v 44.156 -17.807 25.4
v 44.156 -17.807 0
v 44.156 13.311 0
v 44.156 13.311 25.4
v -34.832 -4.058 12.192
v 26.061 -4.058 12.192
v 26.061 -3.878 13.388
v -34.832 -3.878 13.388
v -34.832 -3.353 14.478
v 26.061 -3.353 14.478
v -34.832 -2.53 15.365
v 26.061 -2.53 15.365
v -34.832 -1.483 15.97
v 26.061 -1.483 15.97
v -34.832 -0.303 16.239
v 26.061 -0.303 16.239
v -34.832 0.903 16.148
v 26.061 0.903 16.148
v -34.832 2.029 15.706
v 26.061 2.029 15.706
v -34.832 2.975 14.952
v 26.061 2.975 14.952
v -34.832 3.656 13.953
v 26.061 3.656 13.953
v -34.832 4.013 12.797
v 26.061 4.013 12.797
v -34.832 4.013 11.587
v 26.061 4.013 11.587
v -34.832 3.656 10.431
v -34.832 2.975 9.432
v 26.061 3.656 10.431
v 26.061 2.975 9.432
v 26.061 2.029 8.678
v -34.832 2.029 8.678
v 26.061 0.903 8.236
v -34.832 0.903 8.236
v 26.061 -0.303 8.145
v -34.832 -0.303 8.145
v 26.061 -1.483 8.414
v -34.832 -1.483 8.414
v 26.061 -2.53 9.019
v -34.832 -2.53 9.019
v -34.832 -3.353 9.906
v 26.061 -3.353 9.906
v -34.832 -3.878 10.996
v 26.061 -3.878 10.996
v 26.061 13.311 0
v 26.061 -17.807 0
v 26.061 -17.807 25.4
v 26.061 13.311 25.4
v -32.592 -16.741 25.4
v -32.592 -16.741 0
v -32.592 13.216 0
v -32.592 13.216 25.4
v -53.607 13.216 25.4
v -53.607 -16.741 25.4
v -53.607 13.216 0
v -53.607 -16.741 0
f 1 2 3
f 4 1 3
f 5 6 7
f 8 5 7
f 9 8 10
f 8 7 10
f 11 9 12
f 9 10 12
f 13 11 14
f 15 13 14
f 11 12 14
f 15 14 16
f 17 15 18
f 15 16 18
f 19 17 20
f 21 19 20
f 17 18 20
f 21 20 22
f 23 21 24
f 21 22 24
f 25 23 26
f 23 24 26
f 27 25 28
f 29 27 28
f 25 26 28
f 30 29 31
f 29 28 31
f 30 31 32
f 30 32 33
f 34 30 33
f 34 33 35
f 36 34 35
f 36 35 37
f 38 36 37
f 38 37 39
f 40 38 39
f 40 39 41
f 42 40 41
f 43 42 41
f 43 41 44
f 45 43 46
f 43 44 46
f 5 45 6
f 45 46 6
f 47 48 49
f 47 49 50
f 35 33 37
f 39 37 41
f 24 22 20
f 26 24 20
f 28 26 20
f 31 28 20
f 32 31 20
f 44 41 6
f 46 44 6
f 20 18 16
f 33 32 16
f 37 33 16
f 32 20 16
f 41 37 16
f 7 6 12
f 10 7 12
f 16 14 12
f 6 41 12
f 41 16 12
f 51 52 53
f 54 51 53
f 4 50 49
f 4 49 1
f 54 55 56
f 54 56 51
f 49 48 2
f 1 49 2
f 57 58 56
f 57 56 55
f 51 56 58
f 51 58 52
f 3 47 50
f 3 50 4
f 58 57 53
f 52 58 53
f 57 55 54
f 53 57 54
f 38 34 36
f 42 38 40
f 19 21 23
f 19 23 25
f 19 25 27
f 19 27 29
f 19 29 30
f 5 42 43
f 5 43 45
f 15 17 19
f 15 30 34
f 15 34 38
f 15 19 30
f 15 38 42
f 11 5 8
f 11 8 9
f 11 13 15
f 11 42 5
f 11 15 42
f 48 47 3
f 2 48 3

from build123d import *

# Parameters (mm, degrees)
F0_W     = 18.095106
F0_H     = 31.11802
F1_DEPTH = 25.4
F2_W     = 21.01551
F2_H     = 29.956792
F3_DEPTH = 25.4
F4_R     = 4.058102
F5_DEPTH = 60.892928


with BuildPart() as f1:
    # F0 (on Top) → F1 (new body)
    with BuildSketch(Plane.XY):
        with Locations((35.108224, -2.248131)):
            Rectangle(F0_W, F0_H)
    extrude(amount=F1_DEPTH)


with BuildPart() as f3:
    # F2 (on Top) → F3 (new body)
    with BuildSketch(Plane.XY):
        with Locations((-43.099418, -1.762664)):
            Rectangle(F2_W, F2_H)
    extrude(amount=F3_DEPTH)


with BuildPart() as f5:
    # F4 (on face) → F5 (new body)
    with BuildSketch(Plane(origin=(26.060671, 0, 0), x_dir=(0, -1, 0), z_dir=(-1, 0, 0))):
        with Locations((0, 12.192026)):
            Circle(F4_R)
    extrude(amount=F5_DEPTH)


solid = Compound([f1.part, f3.part, f5.part])
